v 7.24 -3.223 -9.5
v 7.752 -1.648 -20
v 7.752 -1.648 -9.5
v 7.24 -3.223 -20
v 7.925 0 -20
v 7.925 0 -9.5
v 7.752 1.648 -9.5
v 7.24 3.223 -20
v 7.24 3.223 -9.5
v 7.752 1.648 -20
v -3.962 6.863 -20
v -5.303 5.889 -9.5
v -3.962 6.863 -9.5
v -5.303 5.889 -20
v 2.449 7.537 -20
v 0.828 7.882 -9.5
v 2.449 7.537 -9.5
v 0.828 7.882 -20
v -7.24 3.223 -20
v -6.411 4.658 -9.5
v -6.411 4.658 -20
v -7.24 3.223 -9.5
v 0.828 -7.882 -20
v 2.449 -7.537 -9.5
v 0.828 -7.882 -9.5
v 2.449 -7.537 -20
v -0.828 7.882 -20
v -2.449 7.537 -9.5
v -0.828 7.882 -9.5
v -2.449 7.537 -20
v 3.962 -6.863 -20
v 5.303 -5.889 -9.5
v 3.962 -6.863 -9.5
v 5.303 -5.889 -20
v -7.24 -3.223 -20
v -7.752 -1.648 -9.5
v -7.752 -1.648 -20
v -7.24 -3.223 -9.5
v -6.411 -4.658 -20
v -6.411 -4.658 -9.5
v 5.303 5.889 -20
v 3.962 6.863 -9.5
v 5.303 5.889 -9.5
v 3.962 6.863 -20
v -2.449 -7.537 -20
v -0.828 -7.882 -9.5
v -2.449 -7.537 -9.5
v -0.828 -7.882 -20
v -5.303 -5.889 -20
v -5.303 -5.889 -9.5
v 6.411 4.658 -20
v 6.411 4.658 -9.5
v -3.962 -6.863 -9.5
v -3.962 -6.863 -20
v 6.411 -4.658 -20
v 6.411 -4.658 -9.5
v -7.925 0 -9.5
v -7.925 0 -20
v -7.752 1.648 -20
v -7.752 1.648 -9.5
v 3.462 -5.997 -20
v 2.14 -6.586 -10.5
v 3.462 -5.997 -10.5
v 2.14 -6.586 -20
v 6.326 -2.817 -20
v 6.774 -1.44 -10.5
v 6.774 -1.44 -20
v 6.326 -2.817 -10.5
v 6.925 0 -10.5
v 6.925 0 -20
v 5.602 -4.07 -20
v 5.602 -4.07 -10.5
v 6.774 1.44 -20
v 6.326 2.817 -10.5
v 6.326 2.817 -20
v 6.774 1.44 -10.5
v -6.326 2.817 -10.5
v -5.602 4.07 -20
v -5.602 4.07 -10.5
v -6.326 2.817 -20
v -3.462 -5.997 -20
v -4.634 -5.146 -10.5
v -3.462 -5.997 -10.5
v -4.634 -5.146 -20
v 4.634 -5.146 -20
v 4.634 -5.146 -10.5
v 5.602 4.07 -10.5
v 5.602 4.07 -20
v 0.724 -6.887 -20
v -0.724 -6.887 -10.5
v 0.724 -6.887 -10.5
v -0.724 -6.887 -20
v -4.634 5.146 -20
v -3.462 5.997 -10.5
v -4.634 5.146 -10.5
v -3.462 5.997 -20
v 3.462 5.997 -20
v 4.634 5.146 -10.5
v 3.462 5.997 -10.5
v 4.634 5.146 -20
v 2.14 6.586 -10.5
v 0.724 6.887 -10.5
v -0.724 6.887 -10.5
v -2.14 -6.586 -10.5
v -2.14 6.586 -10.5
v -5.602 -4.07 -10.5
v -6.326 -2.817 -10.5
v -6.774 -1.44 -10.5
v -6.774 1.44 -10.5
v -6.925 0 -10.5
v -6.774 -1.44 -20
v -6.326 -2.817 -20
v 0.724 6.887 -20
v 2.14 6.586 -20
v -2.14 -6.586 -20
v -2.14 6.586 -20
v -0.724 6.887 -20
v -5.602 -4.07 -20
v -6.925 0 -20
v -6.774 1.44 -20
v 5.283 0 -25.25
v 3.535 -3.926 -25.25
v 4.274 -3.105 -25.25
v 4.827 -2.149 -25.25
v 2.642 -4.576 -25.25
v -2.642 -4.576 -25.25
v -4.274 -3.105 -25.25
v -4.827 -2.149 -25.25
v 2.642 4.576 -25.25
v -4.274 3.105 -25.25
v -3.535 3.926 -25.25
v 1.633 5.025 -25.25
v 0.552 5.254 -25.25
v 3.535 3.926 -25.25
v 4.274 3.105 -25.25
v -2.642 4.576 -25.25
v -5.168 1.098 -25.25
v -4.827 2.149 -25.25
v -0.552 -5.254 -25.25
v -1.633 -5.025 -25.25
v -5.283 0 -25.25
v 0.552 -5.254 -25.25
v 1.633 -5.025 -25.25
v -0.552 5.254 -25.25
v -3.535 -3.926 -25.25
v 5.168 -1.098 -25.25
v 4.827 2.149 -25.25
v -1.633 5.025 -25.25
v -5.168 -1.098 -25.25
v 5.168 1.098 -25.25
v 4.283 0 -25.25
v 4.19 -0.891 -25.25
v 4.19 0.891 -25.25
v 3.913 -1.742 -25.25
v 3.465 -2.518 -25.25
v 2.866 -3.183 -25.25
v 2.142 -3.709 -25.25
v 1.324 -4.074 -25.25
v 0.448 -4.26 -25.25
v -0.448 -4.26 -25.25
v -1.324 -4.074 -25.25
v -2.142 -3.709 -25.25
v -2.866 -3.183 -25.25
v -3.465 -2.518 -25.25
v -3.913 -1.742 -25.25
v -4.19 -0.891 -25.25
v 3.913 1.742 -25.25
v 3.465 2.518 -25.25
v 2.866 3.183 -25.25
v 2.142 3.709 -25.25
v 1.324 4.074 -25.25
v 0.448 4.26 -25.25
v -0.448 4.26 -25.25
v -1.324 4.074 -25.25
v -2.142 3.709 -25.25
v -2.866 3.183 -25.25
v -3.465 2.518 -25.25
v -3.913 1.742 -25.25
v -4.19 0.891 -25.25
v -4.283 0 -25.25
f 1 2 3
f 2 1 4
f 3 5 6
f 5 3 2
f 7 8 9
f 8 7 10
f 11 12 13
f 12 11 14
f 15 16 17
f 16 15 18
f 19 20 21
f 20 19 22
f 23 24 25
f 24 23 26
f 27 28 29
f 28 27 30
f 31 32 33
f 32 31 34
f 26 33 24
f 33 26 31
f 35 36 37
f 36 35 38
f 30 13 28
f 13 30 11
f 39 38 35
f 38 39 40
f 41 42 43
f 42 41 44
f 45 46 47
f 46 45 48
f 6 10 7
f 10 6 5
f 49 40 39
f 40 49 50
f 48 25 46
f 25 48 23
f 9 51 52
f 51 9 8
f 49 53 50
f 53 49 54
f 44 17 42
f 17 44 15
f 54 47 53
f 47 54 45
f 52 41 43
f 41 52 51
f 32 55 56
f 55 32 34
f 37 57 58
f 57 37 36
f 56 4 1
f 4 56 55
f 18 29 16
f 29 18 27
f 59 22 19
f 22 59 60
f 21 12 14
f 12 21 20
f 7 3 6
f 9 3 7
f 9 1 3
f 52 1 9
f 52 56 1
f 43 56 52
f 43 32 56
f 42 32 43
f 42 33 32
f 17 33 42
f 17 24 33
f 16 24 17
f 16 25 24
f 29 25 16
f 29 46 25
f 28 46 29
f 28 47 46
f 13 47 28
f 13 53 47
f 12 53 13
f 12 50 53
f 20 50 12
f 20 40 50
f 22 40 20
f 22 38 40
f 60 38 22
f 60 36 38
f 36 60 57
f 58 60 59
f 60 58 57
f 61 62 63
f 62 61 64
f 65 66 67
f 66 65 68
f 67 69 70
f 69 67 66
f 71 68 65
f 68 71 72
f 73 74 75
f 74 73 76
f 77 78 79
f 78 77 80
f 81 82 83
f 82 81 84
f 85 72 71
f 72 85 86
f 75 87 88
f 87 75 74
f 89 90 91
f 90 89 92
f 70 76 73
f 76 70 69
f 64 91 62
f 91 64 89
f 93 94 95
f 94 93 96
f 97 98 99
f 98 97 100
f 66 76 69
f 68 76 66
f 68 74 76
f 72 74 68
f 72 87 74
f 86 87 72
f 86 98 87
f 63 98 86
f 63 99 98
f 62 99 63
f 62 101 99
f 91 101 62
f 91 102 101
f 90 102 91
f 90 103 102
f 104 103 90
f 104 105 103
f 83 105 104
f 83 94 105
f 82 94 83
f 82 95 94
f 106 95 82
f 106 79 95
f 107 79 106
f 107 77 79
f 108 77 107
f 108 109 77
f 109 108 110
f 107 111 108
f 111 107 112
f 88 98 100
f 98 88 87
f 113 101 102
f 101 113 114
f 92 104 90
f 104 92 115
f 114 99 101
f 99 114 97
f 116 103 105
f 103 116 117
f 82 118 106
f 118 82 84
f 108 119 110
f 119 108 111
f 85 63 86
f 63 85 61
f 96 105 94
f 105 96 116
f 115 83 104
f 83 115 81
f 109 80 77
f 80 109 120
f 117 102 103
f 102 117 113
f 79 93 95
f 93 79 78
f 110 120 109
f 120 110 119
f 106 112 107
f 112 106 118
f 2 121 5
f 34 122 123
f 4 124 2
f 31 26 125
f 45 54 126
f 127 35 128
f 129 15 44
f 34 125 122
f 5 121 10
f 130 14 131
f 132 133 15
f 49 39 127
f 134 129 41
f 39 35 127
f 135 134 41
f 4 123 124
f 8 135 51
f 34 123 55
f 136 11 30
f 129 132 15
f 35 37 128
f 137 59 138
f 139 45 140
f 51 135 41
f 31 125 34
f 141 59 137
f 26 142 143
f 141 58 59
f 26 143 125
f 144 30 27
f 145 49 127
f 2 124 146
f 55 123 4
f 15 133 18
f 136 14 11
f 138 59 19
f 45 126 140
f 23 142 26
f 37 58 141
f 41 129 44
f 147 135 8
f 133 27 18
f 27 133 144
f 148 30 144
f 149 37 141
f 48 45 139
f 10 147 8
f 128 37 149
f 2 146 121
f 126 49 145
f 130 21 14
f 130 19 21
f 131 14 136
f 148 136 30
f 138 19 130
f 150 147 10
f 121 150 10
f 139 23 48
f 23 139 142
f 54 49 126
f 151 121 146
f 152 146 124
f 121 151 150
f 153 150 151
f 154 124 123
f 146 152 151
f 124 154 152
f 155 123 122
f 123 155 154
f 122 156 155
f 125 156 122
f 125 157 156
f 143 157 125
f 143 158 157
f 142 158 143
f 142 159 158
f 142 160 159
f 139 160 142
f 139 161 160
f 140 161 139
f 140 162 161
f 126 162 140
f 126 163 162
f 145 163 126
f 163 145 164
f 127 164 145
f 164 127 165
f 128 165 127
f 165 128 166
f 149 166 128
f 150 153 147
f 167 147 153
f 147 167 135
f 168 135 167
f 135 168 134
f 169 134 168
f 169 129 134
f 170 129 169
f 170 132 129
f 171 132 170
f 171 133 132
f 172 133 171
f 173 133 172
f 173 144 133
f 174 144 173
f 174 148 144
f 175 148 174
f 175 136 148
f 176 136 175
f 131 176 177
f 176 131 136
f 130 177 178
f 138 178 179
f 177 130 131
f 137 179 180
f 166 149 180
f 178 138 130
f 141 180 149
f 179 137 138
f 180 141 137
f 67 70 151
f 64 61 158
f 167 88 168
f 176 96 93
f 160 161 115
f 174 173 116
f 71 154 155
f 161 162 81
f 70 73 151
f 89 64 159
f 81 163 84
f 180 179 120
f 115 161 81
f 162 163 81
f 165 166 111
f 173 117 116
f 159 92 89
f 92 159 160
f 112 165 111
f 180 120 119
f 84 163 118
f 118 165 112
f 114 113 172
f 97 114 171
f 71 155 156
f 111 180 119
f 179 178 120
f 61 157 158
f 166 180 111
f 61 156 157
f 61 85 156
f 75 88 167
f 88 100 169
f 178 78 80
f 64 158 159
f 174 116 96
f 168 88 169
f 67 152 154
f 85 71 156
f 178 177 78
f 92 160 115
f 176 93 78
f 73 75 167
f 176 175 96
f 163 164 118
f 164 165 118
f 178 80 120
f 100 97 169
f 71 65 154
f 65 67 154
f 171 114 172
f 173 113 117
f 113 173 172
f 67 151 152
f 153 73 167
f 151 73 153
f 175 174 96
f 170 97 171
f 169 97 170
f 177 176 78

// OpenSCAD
//////////////////////////////////////////////
//  ***TeMoG - Tentacle Mold Generator***   //
//  by Jonas Jørgensen (jonj@sdu.dk) 2020   //
//                                          //
//  Shared under a Creative Commons         //
//  Attribution-ShareAlike (CC BY-SA 3.0)   //
//  license                                 //
//////////////////////////////////////////////

//Extra Part - Plant holder (used for "Phytomatonic 01" - described under case studies in the instruction manual)

$fn=30; //Set to 200 when generating the molds for 3D printing

//Main cone and mold
h = 180; //Cone height
maxDiam = 45; //Cone
minDiam = 35; //Cone
centerSolidDiam=15;
moldWallThickness = 3;
footDiam=100; //Foot for mold
siliconeThickness=3; //Outer
dividersThickness = 5;

//Bottom
straightHeightBottom = 20;
bottomThickness=4;
LDRHolderDiam= minDiam+3;
delta=0.4; //Inaccuracy of printer (layering and overextrusion)
LDRHoleDepth=8;
LDRHolderThickness = 8 +2.5;
LDRDiam=6;
LDRWireHolesDist=3;
LDRHoleDist=LDRHolderDiam/2-LDRDiam;
LDRNumber=3;

//Top part
straightHeight= 30; 
wiresDiameter=5; 

//Joints
jointThickness = 3;

//Finishing mold:
finMoldHeight=25;
finMoldWidth=30;
supportMoldLength=60;
supportMoldWidth=30;
FinalBottomThickness =8;

//Plant part
plantHoleDiam=16.25;
plantScrewsDiam=3.5;

translate ([0,0,-straightHeightBottom+(LDRHolderThickness-bottomThickness)])rotate(180, [1,0,0]) union() {

difference(){
//Main cylinder
translate([0,0,-bottomThickness]) cylinder(LDRHolderThickness,d2=plantHoleDiam-delta,d1=plantHoleDiam-delta);
translate([0,0,-bottomThickness+1]) cylinder(LDRHolderThickness+1,d2=plantHoleDiam-delta-2,d1=plantHoleDiam-delta-2);

//Hole for wires
cylinder(bottomThickness*2,d2=3,d1=2);

}

//Top cone-like part
difference() {
translate([0,0,(LDRHolderThickness-bottomThickness)]) cylinder(LDRHolderThickness/2,d1=plantHoleDiam-delta,d2=(2/3)*(plantHoleDiam-delta));
translate([0,0,(LDRHolderThickness-bottomThickness)]) cylinder(LDRHolderThickness/2,d1=plantHoleDiam-delta-2,d2=(2/3)*(plantHoleDiam-delta)-2);
}
}
